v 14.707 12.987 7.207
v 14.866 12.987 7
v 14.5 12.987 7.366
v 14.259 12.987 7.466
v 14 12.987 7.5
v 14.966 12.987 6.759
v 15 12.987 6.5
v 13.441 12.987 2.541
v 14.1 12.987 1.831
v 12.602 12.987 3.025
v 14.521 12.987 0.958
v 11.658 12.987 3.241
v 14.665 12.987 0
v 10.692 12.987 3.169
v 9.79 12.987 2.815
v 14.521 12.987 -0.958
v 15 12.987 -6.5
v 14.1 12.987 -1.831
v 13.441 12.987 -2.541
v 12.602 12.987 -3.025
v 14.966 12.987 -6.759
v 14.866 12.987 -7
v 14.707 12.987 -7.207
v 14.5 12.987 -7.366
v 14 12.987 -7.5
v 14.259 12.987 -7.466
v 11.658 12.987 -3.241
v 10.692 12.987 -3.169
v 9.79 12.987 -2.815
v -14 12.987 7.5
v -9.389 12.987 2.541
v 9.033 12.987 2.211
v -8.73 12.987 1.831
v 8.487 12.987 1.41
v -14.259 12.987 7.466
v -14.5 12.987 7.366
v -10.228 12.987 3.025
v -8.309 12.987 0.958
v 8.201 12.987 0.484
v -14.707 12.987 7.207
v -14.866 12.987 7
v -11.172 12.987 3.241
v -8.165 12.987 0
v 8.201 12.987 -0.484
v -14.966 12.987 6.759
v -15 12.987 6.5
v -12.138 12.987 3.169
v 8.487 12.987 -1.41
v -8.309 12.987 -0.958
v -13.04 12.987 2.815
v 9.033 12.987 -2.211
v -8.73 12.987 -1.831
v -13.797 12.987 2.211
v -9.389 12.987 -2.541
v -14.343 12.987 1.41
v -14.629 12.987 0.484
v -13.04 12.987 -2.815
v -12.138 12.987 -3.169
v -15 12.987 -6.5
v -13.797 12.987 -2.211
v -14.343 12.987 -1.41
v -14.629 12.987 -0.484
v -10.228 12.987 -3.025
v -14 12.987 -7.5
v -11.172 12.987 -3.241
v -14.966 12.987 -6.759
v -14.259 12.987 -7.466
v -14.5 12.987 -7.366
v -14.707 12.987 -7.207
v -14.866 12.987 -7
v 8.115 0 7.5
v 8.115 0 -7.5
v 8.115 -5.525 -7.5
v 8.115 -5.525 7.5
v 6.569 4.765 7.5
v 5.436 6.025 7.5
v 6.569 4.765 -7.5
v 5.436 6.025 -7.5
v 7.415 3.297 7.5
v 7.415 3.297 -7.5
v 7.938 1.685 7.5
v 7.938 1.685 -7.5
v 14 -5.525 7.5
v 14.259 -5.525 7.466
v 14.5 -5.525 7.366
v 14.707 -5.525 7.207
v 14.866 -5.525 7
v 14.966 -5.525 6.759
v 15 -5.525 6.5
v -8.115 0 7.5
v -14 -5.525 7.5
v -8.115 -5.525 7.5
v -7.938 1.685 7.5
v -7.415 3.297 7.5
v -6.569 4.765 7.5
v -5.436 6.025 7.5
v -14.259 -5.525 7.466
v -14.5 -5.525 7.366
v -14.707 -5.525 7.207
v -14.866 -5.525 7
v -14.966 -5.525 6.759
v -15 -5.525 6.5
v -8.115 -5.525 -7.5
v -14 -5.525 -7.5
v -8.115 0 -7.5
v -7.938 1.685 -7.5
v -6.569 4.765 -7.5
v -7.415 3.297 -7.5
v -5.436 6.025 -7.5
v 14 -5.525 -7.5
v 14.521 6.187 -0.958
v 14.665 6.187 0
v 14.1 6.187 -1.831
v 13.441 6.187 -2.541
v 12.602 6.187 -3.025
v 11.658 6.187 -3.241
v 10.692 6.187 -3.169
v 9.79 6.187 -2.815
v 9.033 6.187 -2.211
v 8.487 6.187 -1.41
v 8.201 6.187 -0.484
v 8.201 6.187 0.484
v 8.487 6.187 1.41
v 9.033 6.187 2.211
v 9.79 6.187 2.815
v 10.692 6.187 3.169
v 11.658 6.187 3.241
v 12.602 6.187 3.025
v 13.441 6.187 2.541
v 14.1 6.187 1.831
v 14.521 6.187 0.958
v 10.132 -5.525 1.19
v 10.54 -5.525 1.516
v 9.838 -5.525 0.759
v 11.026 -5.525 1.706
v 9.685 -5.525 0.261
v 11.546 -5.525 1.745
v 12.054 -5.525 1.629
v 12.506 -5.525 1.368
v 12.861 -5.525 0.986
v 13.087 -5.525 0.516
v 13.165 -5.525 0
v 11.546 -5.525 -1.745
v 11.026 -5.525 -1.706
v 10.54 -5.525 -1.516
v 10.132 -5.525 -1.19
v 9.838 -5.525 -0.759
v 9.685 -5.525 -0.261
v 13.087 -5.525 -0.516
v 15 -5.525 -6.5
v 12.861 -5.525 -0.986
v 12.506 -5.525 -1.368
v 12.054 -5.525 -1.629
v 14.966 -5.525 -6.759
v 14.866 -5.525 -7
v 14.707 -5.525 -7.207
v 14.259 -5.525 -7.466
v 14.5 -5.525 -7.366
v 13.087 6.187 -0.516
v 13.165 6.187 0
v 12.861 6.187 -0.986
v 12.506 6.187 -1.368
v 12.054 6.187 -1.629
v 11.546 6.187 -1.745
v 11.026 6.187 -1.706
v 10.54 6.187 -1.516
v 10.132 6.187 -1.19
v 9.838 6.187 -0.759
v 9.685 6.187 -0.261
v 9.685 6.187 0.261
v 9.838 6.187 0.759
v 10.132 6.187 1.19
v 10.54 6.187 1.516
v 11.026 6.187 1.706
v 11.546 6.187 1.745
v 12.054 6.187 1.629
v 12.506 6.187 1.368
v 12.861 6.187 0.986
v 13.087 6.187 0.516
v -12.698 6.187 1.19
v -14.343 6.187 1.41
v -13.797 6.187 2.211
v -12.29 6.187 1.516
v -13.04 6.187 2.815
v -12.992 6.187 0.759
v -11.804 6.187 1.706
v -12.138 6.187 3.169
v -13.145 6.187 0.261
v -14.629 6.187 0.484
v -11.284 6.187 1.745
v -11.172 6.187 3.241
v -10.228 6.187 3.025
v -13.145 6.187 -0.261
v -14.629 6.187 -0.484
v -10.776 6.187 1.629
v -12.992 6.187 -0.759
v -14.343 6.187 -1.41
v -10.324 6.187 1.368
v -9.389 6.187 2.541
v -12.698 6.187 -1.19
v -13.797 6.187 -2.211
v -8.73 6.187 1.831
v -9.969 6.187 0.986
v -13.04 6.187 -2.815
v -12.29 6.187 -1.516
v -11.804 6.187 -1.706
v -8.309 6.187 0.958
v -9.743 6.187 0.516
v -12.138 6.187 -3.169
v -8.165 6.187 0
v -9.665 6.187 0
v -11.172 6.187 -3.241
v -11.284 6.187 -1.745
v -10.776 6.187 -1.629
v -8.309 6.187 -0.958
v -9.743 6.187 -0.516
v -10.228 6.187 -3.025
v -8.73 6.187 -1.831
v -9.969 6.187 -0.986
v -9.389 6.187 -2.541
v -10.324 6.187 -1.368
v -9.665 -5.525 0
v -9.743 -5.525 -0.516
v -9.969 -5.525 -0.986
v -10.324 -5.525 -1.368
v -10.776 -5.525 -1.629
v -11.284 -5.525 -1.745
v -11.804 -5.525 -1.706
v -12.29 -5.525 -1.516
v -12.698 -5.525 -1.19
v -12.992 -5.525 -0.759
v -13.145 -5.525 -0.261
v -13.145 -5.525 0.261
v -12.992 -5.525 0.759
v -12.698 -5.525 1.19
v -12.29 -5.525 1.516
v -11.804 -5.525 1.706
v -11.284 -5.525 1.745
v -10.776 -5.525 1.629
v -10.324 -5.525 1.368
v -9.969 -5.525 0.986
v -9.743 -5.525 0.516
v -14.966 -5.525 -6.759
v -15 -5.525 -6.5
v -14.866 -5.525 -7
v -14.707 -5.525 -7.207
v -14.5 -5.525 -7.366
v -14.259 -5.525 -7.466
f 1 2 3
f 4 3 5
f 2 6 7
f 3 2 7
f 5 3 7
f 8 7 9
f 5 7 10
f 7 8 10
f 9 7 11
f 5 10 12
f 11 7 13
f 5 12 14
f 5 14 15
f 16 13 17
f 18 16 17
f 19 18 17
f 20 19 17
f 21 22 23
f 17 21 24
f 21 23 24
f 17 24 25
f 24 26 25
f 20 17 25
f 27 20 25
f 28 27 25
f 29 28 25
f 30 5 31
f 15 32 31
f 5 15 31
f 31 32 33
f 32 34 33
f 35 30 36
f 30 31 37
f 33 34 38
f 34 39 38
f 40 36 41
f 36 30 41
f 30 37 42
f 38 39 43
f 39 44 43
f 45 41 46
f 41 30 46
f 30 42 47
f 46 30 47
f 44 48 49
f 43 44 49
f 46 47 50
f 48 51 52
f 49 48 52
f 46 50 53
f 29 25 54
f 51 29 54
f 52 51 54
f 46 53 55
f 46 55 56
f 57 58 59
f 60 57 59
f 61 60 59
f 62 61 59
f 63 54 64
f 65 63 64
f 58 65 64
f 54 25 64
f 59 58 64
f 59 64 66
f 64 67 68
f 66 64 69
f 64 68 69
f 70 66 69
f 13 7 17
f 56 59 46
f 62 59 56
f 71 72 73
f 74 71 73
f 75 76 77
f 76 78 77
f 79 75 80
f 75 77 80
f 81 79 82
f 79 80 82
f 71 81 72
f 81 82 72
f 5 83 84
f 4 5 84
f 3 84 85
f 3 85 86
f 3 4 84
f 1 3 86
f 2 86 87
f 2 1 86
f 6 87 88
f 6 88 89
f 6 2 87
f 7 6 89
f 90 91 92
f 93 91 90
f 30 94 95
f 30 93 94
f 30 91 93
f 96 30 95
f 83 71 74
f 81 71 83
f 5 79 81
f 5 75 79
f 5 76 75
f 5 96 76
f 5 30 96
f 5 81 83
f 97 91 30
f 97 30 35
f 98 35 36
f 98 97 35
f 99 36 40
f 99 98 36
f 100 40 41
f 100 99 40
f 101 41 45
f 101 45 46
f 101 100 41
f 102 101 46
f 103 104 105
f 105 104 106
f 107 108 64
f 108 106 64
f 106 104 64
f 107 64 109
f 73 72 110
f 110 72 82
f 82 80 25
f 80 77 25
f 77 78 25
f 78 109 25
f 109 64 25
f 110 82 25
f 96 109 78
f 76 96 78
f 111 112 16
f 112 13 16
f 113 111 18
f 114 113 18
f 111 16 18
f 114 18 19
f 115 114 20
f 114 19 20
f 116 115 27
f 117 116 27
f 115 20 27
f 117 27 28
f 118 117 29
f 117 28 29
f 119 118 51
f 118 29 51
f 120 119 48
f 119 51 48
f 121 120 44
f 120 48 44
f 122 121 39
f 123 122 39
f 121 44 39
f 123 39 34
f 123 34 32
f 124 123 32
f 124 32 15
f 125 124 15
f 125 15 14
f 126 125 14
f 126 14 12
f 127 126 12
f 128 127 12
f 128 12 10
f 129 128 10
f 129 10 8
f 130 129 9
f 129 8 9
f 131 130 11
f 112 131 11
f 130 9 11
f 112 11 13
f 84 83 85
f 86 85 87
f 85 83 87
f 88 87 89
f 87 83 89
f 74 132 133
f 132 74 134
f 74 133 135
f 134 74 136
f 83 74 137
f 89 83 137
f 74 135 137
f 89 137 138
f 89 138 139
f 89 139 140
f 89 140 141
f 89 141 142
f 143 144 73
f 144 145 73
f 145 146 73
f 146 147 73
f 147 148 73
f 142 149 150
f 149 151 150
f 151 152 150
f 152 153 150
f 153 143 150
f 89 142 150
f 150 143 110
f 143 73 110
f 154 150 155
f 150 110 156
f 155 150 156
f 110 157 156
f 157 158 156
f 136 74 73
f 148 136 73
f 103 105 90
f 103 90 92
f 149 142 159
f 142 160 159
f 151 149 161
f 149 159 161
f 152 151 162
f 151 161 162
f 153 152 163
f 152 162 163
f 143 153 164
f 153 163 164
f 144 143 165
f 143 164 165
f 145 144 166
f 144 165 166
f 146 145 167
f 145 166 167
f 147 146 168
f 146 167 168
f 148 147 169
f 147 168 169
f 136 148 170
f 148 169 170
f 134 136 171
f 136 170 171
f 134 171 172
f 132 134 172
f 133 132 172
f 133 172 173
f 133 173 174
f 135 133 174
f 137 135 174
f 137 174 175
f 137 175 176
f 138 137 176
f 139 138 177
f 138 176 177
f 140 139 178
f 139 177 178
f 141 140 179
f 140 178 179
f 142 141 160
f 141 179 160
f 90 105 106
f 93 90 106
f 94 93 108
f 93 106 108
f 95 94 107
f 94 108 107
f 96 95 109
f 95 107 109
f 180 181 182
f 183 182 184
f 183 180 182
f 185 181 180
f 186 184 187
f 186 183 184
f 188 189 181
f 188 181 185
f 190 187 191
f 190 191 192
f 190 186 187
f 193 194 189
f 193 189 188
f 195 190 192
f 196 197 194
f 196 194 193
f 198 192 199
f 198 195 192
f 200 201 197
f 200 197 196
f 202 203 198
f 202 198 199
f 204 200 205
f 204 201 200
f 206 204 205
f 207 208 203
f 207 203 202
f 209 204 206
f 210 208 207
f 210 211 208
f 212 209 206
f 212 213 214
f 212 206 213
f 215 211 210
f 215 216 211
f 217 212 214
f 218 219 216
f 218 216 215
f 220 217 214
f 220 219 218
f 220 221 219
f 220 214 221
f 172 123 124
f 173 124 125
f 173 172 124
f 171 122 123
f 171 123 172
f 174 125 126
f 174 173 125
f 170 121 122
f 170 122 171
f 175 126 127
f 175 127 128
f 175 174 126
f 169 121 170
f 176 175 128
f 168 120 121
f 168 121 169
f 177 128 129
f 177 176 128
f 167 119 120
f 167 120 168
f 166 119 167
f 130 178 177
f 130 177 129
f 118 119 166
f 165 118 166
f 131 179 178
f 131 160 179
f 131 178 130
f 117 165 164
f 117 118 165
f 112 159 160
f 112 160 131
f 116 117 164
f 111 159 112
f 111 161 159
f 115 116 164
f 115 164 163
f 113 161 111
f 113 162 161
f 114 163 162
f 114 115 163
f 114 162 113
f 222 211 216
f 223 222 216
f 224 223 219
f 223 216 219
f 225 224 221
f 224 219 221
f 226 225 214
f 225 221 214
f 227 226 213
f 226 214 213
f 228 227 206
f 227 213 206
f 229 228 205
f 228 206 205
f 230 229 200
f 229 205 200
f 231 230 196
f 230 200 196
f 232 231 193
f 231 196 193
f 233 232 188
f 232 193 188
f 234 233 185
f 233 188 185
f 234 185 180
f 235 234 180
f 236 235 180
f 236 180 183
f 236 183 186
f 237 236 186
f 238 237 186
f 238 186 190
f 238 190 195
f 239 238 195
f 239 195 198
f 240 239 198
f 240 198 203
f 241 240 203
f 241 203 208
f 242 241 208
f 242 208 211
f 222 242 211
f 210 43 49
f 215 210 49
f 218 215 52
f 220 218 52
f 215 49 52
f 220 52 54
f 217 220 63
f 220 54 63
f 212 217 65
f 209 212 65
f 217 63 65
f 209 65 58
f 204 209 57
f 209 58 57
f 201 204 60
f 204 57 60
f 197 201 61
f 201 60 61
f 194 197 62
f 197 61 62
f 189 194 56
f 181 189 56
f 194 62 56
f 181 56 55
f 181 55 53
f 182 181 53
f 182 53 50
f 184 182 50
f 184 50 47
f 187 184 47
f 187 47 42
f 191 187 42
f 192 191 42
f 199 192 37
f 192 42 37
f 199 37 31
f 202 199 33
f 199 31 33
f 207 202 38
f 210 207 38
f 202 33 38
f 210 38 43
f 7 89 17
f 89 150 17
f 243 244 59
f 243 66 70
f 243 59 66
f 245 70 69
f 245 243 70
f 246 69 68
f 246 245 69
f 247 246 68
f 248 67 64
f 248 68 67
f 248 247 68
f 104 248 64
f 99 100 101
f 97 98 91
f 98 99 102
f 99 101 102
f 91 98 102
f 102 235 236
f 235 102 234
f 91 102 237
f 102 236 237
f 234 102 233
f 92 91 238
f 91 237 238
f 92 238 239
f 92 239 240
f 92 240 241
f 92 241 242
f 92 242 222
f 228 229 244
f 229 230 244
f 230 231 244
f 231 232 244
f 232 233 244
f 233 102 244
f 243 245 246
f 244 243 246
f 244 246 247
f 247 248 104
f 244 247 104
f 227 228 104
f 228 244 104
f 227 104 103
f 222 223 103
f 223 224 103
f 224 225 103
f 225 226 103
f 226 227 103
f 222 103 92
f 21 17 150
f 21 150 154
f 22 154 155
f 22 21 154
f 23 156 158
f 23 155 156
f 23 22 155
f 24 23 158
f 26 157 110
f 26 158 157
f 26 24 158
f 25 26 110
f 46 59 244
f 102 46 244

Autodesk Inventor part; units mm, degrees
ref_plane "YZ Plane" through (0, 0, 0) normal (1, 0, 0) x (0, 1, 0)
ref_plane "XZ Plane" through (0, 0, 0) normal (0, 1, 0) x (-1, 0, 0)
ref_plane "XY Plane" through (0, 0, 0) normal (0, 0, 1) x (1, 0, 0)
sketch "Mount Shape Sketch" plane through (0, 0, 0) normal (0, 0, 1) x (1, 0, 0)
  circle A0 centre (0, 0) radius 8.115
  line L0 (-5.4362, 6.025) -> (5.4362, 6.025)
  line L1 (-5.4362, -6.025) -> (5.4362, -6.025)
  line L2 (-8.115, 0) -> (-8.115, -5.525)
  line L3 (8.115, 0) -> (8.115, -5.525)
  line L4 (8.115, -5.525) -> (15, -5.525)
  line L5 (15, -5.525) -> (15, 12.9873)
  line L6 (15, 12.9873) -> (-15, 12.9873)
  line L7 (-15, 12.9873) -> (-15, -5.525)
  line L8 (-15, -5.525) -> (-8.115, -5.525)
  line L9 (0, 17.2077) -> (0, -12.3355) construction
  dimension "d0" = 16.23
  dimension "d1" = 12.05
  dimension "d3" = 30
  dimension "d15" = 12.9873
  dimension "d18" = 0.5
extrude "Mount Shape" add sketch "Mount Shape Sketch" along normal mid plane 15 contours A0 L2 L8 L7 L6 L5 L4 L3 | L0 A0
sketch "Sketch2" plane through (-15, 12.9873, 7.5) normal (0, 1, 0) x (1, 0, 0)
  circle A0 centre (3.585, 7.5) radius 1.75
  line L0 (20.4362, 15) -> (9.5638, 15) construction
  line L1 (15, 15) -> (15, 0) construction
  line L2 (30, 0) -> (0, 0) construction
  line L3 (15, 7.5) -> (3.585, 7.5) construction
  circle A1 centre (26.415, 7.5) radius 1.75
  dimension "d6" = 3.5
  dimension "d7" = 11.415
  dimension "d14" = 22.83
extrude "Screw Shaft Holes" cut sketch "Sketch2" against normal through all
sketch "Sketch3" plane through (-15, 12.9873, 7.5) normal (0, 1, 0) x (1, 0, 0)
  circle A0 centre (3.585, 7.5) radius 1.75 projected
  circle A1 centre (3.585, 7.5) radius 3.25
  circle A2 centre (26.415, 7.5) radius 3.25
  circle A3 centre (26.415, 7.5) radius 1.75 projected
  point P0 (15, 7.5)
  dimension "d10" = 6.5
extrude "Screw Head Holes" cut sketch "Sketch3" against normal blind 6.8 contours A0 | A1 | A2 | A3
fillet "Outer Fillet" radius 1 4 edges at (15, 3.7311, -7.5) (15, 3.7311, 7.5) (-15, 3.7311, 7.5) (-15, 3.7311, -7.5)
properties part number "Large Drive Motors Mount Cap"
